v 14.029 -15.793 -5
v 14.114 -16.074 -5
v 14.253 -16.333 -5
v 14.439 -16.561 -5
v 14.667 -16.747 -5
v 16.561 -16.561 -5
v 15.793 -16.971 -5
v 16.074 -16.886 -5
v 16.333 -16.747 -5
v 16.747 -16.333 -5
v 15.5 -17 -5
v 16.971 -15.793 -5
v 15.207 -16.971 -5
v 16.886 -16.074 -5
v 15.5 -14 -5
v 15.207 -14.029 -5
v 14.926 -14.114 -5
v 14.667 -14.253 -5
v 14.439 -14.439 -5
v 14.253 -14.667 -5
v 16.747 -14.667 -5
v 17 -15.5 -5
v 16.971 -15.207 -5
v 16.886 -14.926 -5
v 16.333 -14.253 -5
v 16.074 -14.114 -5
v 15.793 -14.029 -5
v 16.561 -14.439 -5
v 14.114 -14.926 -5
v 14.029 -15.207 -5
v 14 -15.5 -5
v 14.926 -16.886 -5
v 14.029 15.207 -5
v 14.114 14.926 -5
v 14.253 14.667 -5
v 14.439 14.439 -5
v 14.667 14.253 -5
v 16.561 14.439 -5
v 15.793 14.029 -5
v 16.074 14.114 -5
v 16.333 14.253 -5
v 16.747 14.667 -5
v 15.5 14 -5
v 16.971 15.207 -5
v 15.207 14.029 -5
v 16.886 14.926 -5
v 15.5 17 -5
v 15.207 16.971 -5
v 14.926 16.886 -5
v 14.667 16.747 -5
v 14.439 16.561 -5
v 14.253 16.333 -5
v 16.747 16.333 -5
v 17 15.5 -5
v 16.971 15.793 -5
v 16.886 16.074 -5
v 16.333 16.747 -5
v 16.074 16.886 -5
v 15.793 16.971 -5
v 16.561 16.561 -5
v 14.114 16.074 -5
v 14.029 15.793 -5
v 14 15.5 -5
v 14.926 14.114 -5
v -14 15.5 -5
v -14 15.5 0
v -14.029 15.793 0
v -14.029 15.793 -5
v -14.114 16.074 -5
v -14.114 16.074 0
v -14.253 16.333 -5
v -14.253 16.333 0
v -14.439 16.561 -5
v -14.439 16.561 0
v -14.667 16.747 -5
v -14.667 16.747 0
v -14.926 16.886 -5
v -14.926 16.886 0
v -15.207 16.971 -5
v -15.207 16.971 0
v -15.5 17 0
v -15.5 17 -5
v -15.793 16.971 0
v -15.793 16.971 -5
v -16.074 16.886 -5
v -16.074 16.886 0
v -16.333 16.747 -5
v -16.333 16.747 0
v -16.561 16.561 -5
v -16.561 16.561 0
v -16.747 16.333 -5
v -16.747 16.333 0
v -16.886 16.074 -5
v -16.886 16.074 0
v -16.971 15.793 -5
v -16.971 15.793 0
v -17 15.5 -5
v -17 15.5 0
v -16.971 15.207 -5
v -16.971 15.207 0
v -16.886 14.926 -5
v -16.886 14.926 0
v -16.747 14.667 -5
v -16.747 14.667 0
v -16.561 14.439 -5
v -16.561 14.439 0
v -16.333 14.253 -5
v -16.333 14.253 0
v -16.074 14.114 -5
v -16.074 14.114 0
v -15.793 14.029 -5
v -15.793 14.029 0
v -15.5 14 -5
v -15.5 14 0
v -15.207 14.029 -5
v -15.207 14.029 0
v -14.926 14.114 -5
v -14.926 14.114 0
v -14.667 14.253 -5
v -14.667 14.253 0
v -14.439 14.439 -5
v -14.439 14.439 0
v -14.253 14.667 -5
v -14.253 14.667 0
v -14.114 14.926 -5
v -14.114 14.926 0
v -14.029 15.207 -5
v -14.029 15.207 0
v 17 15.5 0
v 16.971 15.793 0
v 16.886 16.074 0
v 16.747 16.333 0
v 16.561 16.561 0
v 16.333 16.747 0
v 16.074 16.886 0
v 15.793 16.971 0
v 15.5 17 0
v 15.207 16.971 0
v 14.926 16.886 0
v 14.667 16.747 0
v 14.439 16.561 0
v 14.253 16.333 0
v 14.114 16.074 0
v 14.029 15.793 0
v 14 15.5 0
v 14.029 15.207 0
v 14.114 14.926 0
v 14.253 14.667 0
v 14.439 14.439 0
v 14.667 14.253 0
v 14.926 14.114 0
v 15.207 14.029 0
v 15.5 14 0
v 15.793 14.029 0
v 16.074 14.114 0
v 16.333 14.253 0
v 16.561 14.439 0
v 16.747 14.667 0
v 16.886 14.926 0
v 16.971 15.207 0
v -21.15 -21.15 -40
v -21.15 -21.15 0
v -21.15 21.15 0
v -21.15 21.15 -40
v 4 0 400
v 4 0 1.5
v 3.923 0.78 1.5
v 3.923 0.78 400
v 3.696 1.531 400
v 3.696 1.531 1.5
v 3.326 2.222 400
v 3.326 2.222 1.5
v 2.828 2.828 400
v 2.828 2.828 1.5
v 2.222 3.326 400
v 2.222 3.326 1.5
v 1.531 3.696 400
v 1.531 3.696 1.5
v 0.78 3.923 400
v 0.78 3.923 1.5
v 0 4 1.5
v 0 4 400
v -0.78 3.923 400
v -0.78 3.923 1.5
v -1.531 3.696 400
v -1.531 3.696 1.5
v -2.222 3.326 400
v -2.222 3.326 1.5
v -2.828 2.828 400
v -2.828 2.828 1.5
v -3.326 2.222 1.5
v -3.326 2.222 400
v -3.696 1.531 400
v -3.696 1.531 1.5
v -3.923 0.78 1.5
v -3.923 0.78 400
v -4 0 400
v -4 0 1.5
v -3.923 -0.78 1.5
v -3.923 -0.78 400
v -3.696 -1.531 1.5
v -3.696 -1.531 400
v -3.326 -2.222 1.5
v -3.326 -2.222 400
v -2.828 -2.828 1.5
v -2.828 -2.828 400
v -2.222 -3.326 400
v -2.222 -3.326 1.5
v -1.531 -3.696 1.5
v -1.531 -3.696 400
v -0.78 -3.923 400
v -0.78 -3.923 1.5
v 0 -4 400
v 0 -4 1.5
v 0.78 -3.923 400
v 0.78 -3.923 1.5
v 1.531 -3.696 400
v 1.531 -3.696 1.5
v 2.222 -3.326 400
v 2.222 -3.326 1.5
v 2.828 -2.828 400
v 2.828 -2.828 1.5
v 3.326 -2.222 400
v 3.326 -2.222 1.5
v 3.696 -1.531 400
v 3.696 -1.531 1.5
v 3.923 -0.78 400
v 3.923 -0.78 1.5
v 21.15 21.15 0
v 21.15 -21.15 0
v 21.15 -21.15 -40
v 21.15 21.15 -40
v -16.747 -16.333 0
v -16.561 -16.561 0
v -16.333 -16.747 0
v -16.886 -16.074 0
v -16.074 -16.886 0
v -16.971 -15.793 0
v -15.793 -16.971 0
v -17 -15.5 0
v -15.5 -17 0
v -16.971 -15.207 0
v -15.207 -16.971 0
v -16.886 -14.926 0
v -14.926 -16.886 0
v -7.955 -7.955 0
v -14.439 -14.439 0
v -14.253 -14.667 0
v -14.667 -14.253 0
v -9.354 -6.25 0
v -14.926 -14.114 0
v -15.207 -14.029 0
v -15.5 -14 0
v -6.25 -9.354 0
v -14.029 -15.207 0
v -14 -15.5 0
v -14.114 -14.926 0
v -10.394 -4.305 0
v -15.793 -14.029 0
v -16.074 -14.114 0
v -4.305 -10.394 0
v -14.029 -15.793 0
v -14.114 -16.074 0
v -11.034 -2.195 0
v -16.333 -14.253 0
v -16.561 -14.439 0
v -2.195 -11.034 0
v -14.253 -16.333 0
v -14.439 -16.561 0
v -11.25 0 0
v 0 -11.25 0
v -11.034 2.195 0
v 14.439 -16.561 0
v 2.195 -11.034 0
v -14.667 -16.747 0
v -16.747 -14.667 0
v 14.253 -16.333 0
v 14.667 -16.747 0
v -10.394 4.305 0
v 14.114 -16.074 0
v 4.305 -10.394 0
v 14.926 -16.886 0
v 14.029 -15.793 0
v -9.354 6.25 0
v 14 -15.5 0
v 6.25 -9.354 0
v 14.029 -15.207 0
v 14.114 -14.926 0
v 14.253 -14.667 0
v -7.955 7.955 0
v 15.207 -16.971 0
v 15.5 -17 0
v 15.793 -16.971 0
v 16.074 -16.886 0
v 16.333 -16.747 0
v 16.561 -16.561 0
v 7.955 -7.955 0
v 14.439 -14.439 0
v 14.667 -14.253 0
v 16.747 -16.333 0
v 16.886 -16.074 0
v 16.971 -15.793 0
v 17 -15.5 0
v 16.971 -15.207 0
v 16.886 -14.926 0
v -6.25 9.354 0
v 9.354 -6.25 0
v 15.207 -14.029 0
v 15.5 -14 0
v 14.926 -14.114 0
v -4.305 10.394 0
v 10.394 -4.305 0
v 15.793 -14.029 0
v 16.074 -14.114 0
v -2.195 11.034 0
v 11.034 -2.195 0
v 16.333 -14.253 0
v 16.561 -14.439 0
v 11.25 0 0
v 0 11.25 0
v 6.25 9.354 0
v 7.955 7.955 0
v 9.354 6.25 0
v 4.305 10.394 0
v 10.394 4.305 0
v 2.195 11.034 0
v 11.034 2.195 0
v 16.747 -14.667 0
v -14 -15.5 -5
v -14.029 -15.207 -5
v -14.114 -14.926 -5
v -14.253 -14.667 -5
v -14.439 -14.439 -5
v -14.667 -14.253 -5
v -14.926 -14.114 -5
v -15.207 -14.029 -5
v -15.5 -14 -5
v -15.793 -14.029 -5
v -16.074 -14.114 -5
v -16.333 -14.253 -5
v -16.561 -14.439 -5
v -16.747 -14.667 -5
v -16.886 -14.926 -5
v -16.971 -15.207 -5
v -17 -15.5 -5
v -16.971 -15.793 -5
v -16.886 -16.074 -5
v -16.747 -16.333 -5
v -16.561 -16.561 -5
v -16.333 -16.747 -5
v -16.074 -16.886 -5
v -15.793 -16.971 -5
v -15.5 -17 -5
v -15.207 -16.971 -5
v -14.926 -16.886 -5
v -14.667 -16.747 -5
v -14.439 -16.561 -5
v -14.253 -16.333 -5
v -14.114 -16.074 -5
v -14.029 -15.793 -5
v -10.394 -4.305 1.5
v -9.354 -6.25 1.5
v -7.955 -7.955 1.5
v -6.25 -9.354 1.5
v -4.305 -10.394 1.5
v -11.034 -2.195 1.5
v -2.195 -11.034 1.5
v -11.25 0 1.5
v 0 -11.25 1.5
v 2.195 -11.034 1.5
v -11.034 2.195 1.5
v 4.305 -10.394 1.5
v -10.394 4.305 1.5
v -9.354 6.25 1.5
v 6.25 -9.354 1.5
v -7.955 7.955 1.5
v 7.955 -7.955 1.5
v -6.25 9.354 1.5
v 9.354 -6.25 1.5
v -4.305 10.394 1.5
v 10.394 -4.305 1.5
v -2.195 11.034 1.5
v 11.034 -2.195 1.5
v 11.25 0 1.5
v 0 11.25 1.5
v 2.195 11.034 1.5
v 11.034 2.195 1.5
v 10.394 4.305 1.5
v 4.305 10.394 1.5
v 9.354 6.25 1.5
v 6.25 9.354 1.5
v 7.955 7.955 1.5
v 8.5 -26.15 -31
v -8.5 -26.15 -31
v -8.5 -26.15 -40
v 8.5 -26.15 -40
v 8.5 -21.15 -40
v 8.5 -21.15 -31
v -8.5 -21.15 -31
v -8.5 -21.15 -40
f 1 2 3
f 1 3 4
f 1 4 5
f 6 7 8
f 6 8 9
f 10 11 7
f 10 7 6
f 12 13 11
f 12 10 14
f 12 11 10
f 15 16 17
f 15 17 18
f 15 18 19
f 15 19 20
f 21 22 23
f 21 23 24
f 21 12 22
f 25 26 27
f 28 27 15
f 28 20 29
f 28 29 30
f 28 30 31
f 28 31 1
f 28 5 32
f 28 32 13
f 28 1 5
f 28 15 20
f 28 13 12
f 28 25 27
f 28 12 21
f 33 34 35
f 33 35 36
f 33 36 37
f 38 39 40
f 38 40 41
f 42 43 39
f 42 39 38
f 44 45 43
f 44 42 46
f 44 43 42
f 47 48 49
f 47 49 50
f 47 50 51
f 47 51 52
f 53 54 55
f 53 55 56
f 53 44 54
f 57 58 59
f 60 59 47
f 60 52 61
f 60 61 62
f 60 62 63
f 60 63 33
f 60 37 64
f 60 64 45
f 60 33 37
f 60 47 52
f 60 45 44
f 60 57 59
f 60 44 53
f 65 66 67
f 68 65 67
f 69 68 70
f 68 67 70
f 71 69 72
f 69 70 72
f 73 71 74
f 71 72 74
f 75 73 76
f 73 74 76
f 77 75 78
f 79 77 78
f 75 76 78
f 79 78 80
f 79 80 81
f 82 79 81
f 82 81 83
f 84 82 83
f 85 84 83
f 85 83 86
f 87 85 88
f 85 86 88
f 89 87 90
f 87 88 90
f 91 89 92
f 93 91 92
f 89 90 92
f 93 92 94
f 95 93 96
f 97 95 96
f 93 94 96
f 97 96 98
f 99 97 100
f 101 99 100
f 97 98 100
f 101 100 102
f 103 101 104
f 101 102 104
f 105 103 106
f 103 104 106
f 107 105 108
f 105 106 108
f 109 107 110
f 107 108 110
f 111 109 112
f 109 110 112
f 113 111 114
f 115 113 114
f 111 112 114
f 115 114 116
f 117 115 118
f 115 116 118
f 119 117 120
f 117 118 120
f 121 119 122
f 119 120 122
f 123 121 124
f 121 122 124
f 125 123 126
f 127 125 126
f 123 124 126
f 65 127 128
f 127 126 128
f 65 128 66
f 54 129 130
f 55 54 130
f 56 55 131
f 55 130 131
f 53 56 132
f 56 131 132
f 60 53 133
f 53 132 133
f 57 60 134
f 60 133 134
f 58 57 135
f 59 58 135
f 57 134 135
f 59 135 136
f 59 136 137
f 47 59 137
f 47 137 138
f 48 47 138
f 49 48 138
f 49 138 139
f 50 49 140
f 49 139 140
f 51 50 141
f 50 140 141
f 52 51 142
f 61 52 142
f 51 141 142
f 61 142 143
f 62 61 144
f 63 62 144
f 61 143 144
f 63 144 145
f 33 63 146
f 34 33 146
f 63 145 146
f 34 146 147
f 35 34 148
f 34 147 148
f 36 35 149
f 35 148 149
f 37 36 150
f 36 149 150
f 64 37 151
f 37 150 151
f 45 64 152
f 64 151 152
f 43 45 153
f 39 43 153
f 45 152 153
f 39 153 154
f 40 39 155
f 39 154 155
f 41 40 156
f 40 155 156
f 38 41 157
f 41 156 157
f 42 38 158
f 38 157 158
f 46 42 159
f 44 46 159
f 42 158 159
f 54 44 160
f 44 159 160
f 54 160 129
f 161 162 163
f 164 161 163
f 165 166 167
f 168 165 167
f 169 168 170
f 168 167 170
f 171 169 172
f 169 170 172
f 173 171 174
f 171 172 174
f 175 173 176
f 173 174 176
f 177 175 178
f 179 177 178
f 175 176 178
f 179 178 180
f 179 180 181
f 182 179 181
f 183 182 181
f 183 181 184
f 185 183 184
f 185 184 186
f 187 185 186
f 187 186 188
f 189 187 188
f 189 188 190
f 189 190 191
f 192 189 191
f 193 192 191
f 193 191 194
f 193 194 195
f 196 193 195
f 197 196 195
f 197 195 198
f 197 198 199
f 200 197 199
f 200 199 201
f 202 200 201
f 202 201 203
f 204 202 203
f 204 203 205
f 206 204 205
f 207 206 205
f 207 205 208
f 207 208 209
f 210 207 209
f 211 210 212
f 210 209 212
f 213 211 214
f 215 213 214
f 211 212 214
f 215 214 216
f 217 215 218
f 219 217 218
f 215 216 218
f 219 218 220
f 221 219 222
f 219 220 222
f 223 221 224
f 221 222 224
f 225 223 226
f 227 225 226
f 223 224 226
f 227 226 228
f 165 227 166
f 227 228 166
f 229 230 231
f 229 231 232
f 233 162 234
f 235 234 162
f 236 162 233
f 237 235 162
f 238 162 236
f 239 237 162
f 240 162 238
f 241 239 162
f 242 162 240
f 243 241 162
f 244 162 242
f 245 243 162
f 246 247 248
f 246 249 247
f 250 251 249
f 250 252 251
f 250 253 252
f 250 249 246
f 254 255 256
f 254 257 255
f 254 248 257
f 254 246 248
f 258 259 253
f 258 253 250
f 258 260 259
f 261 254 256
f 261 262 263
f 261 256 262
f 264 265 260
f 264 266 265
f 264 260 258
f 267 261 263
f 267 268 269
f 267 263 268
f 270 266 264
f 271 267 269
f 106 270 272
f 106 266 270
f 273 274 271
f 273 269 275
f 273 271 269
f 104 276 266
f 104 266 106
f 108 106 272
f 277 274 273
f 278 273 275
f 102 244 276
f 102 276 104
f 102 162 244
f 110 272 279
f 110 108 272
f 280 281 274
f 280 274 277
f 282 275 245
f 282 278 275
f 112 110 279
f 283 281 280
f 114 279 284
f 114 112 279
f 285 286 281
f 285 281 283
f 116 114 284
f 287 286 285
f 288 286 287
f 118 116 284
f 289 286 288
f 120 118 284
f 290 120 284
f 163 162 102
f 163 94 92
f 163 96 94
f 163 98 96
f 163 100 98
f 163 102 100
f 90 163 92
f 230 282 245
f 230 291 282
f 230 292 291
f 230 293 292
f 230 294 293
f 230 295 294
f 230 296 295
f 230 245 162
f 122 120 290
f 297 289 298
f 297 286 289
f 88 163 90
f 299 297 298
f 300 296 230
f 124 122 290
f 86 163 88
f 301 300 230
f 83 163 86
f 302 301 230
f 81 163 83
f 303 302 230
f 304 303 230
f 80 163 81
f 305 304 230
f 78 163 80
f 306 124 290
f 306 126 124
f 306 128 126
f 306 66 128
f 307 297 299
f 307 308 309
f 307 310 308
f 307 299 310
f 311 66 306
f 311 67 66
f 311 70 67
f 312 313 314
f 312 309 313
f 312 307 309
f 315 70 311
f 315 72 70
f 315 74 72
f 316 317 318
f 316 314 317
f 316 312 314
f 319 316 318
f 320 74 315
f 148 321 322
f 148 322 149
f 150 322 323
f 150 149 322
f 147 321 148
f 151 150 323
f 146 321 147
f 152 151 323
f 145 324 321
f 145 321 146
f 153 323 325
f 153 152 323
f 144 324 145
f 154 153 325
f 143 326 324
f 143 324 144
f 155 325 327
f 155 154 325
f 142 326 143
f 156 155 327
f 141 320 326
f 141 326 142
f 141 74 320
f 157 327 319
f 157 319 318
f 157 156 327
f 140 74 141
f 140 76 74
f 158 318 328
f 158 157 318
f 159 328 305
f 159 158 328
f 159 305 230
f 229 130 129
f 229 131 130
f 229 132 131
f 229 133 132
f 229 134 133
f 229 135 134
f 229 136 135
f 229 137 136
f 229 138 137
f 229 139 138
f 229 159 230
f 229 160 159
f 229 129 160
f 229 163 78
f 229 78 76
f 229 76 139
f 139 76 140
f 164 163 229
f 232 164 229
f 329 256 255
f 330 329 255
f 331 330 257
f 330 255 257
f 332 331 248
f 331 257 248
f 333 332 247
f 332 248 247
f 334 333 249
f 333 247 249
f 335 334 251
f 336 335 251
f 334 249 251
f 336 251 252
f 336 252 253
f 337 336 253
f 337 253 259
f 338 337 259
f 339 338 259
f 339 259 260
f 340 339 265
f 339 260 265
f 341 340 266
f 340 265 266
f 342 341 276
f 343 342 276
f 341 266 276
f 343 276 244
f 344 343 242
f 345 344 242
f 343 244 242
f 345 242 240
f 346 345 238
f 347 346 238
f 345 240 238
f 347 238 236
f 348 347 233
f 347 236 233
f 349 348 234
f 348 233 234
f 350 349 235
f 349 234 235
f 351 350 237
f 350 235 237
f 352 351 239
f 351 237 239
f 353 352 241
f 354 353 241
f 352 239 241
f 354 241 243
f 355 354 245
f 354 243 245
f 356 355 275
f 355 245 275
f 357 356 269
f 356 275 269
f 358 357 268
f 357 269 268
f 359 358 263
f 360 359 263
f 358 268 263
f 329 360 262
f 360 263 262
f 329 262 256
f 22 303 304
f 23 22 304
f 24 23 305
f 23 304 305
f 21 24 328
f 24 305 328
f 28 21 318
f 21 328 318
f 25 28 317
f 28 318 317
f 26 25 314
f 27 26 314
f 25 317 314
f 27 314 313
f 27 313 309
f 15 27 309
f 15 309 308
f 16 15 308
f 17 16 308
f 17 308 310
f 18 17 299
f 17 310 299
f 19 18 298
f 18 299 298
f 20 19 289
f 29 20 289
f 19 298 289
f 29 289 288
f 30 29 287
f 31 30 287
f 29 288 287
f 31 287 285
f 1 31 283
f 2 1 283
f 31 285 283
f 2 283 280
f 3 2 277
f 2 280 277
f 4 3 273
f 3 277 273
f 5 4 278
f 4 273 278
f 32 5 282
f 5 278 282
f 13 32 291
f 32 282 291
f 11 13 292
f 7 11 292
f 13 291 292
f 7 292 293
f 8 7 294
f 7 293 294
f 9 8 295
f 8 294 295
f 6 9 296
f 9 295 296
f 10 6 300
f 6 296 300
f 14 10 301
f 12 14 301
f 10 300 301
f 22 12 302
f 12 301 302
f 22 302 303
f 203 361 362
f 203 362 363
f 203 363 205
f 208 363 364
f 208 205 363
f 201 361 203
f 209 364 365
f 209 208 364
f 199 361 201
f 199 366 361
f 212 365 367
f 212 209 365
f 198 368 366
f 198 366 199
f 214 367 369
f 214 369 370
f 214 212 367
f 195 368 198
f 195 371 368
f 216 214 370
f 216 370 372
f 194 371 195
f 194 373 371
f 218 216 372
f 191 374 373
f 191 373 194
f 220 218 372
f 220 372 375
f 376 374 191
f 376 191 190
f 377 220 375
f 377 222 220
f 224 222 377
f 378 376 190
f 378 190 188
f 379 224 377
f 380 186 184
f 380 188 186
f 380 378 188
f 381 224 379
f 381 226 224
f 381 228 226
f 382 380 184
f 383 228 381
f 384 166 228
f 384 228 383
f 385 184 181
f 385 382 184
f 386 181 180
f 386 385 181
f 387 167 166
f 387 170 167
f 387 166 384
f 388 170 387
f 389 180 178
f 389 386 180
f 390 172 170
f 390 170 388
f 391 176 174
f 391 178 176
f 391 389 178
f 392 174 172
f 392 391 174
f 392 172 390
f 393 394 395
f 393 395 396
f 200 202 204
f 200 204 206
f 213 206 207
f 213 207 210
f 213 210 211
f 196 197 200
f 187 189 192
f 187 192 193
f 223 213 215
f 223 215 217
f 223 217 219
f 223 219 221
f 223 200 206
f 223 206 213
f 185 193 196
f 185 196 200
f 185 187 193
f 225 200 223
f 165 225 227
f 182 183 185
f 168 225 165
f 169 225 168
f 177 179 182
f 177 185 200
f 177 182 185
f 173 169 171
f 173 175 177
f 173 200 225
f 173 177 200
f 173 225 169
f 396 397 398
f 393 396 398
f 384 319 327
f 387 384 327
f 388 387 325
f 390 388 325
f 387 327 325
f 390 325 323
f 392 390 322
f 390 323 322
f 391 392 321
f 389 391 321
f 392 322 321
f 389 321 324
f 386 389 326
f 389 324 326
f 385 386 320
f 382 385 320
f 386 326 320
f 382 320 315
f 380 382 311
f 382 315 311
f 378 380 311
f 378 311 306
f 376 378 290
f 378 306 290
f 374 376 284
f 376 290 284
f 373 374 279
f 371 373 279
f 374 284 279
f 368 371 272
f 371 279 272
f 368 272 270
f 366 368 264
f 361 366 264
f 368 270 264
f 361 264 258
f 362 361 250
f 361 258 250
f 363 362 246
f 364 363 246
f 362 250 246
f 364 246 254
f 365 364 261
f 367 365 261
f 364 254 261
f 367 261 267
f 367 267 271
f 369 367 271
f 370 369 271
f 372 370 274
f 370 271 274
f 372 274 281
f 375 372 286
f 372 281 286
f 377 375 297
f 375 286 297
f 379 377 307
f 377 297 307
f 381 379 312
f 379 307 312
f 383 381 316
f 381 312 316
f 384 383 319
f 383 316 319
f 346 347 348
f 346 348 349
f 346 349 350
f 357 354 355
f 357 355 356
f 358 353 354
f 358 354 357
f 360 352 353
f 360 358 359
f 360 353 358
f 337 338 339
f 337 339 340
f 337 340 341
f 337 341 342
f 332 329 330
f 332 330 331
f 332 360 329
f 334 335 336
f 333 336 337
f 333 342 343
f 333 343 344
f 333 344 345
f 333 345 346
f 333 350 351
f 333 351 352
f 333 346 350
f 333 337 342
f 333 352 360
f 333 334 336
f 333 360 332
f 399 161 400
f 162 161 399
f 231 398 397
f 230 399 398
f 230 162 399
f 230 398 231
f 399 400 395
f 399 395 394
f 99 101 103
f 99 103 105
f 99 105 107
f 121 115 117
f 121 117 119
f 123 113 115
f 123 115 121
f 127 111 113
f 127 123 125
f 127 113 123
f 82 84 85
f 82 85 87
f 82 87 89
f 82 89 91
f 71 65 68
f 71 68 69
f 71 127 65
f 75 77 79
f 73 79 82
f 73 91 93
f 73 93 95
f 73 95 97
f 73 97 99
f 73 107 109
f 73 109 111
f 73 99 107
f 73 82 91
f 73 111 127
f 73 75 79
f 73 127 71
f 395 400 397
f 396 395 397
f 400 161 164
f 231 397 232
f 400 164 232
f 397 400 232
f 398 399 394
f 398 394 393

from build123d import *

# Parameters (mm, degrees)
SKETCH1_W           = 42.3
SKETCH1_H           = 42.3
BOSS_EXTRUDE1_DEPTH = 40
SKETCH1_3_R         = 1.5
CUT_EXTRUDE1_DEPTH  = 5
SKETCH1_4_R         = 11.25
SKETCH1_4_R_2       = 4
BOSS_EXTRUDE2_DEPTH = 1.5
SKETCH1_5_R         = 4
BOSS_EXTRUDE3_DEPTH = 400
SKETCH3_W           = 17
SKETCH3_H           = 9
BOSS_EXTRUDE4_DEPTH = 5


with BuildPart() as part:
    # Sketch1 → Boss-Extrude1 (new body)
    with BuildSketch(Plane.XY):
        Rectangle(SKETCH1_W, SKETCH1_H)
    extrude(amount=-BOSS_EXTRUDE1_DEPTH)

    # Sketch1<3> → Cut-Extrude1 (cut)
    with BuildSketch(Plane.XY):
        with Locations((-15.5, -15.5)):
            Circle(SKETCH1_3_R)
        with Locations((15.5, 15.5)):
            Circle(SKETCH1_3_R)
        with Locations((15.5, -15.5)):
            Circle(SKETCH1_3_R)
        with Locations((-15.5, 15.5)):
            Circle(SKETCH1_3_R)
    extrude(amount=-CUT_EXTRUDE1_DEPTH, mode=Mode.SUBTRACT)

    # Sketch1<4> → Boss-Extrude2 (add)
    with BuildSketch(Plane.XY):
        Circle(SKETCH1_4_R)
        Circle(SKETCH1_4_R_2, mode=Mode.SUBTRACT)
    extrude(amount=BOSS_EXTRUDE2_DEPTH)

    # Sketch1<5> → Boss-Extrude3 (add)
    with BuildSketch(Plane.XY):
        Circle(SKETCH1_5_R)
    extrude(amount=BOSS_EXTRUDE3_DEPTH)

    # Sketch3 → Boss-Extrude4 (add)
    with BuildSketch(Plane.XZ.offset(21.15)):
        with Locations((0, -35.5)):
            Rectangle(SKETCH3_W, SKETCH3_H)
    extrude(amount=BOSS_EXTRUDE4_DEPTH)


solid = part.part
